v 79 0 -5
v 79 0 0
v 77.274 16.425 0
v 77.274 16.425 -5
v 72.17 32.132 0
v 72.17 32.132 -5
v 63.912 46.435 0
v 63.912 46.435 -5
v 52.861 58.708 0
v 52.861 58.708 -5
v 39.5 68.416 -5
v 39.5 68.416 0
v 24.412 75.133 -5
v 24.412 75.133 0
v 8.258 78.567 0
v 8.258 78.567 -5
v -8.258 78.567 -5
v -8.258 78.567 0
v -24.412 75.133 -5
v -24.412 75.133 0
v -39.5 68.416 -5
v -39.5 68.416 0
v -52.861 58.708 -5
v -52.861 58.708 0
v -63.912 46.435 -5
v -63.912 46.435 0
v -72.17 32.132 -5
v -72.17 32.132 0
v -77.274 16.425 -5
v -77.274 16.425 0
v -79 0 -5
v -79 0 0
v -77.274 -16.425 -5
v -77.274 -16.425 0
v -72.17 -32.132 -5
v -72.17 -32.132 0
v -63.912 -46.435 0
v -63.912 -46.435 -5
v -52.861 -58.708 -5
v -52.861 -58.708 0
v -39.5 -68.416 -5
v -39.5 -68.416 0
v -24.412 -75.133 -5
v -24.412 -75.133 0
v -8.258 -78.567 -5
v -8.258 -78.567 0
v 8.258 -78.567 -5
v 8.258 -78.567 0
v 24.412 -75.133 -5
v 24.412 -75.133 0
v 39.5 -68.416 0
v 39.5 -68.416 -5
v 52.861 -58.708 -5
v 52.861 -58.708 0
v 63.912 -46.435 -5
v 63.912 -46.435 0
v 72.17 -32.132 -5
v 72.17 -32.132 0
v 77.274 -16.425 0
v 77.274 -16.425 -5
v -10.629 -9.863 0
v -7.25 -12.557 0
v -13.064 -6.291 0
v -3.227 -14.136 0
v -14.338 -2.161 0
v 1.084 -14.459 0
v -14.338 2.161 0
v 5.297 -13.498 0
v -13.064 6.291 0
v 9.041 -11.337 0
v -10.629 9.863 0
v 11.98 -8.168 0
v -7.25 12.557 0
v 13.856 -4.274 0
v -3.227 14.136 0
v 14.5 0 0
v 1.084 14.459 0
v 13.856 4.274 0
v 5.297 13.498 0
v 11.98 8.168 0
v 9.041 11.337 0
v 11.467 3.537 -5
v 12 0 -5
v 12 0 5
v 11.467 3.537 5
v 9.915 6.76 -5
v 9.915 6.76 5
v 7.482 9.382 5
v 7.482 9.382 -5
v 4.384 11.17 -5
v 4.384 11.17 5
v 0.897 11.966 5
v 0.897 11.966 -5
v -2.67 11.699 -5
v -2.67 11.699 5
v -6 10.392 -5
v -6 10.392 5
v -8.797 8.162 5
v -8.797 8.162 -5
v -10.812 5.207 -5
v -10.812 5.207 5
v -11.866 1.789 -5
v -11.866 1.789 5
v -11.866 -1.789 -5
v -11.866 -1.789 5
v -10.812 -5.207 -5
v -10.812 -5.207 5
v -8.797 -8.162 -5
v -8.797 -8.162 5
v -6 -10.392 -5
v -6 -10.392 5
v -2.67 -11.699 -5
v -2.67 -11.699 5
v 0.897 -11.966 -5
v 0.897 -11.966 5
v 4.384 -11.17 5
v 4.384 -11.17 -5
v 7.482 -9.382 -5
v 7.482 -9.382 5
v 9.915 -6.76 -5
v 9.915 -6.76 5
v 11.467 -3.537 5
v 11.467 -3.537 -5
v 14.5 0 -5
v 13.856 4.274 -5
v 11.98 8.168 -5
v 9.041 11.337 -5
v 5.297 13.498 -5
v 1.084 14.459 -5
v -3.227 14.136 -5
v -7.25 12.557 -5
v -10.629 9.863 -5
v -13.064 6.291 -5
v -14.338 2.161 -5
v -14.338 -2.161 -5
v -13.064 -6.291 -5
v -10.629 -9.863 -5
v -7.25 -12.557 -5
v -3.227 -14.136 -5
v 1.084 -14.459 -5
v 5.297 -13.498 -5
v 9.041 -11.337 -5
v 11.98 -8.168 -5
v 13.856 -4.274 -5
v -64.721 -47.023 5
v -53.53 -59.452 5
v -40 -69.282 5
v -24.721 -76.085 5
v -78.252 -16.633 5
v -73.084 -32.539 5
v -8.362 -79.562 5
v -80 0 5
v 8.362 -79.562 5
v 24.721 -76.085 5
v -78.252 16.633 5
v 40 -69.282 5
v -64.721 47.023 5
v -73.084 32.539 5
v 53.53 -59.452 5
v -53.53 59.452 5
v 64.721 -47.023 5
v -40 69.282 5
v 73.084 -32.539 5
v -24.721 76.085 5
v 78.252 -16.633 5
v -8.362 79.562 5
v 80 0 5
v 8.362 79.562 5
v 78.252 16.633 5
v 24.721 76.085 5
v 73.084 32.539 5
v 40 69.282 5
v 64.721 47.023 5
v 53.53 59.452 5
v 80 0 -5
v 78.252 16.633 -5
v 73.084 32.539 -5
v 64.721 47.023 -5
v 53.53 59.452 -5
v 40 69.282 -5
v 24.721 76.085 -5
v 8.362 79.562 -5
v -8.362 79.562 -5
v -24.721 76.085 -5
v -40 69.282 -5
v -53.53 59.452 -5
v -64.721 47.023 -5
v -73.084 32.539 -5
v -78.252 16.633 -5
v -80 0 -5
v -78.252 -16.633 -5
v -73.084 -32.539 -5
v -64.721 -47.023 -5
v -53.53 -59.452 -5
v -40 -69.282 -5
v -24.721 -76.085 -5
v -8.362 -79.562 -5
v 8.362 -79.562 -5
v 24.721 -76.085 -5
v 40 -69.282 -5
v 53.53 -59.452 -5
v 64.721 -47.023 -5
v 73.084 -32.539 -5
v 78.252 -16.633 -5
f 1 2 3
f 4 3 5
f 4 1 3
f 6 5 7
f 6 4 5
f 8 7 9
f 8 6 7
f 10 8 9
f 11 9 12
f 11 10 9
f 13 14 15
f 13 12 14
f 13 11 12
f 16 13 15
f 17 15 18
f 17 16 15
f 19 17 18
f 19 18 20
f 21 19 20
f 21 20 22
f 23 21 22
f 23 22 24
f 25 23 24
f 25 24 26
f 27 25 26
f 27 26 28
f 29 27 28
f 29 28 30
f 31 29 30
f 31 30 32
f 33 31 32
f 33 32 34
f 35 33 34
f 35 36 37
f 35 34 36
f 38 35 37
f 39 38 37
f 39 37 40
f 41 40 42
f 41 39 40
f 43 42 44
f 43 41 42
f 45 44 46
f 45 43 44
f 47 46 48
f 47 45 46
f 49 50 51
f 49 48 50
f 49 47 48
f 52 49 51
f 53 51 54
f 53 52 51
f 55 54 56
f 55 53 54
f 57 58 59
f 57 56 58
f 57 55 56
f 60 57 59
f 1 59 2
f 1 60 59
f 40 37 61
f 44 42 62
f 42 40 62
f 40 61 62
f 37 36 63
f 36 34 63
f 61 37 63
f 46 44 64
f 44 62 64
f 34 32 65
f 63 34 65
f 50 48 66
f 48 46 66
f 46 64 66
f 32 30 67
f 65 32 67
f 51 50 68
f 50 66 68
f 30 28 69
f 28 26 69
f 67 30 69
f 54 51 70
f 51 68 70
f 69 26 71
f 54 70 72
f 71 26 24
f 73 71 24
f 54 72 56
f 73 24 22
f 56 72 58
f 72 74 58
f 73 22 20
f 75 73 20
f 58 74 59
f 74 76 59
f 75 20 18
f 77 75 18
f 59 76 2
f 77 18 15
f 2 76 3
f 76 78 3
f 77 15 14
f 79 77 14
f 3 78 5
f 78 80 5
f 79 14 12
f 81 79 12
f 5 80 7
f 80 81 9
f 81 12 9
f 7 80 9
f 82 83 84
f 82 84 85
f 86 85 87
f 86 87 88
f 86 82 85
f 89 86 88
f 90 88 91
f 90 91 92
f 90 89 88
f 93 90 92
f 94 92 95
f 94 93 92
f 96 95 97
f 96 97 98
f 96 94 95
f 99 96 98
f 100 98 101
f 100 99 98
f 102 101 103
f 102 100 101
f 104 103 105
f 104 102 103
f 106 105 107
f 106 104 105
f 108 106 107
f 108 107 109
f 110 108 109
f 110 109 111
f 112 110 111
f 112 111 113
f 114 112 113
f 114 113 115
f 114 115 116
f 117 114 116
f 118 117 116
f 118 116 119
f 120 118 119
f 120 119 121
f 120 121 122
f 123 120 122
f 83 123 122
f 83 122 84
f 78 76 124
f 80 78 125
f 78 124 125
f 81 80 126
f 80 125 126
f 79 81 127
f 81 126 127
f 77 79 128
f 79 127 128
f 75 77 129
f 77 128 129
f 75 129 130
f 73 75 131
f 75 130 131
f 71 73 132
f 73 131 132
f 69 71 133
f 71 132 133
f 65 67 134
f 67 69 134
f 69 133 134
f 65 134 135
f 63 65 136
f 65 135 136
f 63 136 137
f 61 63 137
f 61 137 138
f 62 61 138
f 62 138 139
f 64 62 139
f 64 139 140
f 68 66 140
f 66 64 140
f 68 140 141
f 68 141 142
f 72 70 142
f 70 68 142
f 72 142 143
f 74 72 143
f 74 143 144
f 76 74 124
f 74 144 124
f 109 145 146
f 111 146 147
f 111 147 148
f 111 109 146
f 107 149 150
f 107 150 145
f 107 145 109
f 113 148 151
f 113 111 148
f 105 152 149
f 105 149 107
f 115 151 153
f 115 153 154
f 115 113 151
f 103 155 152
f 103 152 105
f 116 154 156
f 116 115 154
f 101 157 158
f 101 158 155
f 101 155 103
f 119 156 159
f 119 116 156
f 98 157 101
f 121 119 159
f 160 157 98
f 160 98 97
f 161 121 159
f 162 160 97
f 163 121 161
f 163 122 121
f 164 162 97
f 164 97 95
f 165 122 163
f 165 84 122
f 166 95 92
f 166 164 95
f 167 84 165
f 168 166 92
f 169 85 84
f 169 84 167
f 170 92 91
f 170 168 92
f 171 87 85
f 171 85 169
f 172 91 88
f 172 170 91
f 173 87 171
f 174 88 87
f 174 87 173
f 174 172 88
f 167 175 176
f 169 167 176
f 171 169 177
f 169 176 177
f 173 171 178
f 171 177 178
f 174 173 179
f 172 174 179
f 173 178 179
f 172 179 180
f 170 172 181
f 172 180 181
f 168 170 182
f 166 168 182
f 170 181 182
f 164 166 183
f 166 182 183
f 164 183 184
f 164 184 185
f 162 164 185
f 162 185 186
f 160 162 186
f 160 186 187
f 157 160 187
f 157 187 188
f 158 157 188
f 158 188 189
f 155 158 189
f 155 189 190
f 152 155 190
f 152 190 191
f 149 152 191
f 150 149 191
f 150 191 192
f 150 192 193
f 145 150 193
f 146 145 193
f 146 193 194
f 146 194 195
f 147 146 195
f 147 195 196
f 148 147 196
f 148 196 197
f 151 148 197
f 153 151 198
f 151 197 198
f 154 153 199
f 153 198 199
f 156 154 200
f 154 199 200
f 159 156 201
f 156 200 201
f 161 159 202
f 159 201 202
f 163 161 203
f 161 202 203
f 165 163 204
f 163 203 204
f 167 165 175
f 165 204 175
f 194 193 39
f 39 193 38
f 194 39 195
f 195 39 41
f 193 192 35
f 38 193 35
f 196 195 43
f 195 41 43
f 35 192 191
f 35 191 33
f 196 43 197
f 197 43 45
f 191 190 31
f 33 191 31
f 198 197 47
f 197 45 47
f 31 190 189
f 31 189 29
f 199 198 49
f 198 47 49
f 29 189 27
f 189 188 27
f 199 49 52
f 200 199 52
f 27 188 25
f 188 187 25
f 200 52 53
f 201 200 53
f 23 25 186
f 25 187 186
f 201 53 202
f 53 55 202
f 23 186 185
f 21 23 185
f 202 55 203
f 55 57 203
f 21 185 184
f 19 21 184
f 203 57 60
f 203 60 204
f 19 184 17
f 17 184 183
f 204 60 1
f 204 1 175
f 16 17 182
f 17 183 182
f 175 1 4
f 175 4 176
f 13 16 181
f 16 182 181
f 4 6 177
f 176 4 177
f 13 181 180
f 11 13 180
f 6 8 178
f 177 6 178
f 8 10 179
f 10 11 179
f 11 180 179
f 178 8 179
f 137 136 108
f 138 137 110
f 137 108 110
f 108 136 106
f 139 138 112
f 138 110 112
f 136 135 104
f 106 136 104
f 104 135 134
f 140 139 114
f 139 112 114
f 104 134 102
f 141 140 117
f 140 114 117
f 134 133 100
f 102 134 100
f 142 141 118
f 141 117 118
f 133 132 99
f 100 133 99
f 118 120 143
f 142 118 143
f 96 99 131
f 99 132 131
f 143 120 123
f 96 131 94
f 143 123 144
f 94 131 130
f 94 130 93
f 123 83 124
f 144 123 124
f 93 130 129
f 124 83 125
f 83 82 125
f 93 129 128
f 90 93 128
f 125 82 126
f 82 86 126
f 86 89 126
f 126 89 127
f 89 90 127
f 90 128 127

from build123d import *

# Parameters (mm, degrees)
SKETCH1_R           = 80
SKETCH1_R_2         = 12
BOSS_EXTRUDE1_DEPTH = 5
BOSS_EXTRUDE2_START = -10
SKETCH2_R           = 14.5
SKETCH2_R_2         = 12
BOSS_EXTRUDE2_DEPTH = 10
BOSS_EXTRUDE3_START = -10
SKETCH3_R           = 80
SKETCH3_R_2         = 79
BOSS_EXTRUDE3_DEPTH = 10


with BuildPart() as part:
    # Sketch1 → Boss-Extrude1 (new body)
    with BuildSketch(Plane.XY):
        Circle(SKETCH1_R)
        Circle(SKETCH1_R_2, mode=Mode.SUBTRACT)
    extrude(amount=BOSS_EXTRUDE1_DEPTH)

    # Sketch2 → Boss-Extrude2 (add)
    with BuildSketch(Plane.XY.offset(5).offset(BOSS_EXTRUDE2_START)):
        Circle(SKETCH2_R)
        Circle(SKETCH2_R_2, mode=Mode.SUBTRACT)
    extrude(amount=BOSS_EXTRUDE2_DEPTH)

    # Sketch3 → Boss-Extrude3 (add)
    with BuildSketch(Plane.XY.offset(5).offset(BOSS_EXTRUDE3_START)):
        Circle(SKETCH3_R)
        Circle(SKETCH3_R_2, mode=Mode.SUBTRACT)
    extrude(amount=BOSS_EXTRUDE3_DEPTH)


solid = part.part
